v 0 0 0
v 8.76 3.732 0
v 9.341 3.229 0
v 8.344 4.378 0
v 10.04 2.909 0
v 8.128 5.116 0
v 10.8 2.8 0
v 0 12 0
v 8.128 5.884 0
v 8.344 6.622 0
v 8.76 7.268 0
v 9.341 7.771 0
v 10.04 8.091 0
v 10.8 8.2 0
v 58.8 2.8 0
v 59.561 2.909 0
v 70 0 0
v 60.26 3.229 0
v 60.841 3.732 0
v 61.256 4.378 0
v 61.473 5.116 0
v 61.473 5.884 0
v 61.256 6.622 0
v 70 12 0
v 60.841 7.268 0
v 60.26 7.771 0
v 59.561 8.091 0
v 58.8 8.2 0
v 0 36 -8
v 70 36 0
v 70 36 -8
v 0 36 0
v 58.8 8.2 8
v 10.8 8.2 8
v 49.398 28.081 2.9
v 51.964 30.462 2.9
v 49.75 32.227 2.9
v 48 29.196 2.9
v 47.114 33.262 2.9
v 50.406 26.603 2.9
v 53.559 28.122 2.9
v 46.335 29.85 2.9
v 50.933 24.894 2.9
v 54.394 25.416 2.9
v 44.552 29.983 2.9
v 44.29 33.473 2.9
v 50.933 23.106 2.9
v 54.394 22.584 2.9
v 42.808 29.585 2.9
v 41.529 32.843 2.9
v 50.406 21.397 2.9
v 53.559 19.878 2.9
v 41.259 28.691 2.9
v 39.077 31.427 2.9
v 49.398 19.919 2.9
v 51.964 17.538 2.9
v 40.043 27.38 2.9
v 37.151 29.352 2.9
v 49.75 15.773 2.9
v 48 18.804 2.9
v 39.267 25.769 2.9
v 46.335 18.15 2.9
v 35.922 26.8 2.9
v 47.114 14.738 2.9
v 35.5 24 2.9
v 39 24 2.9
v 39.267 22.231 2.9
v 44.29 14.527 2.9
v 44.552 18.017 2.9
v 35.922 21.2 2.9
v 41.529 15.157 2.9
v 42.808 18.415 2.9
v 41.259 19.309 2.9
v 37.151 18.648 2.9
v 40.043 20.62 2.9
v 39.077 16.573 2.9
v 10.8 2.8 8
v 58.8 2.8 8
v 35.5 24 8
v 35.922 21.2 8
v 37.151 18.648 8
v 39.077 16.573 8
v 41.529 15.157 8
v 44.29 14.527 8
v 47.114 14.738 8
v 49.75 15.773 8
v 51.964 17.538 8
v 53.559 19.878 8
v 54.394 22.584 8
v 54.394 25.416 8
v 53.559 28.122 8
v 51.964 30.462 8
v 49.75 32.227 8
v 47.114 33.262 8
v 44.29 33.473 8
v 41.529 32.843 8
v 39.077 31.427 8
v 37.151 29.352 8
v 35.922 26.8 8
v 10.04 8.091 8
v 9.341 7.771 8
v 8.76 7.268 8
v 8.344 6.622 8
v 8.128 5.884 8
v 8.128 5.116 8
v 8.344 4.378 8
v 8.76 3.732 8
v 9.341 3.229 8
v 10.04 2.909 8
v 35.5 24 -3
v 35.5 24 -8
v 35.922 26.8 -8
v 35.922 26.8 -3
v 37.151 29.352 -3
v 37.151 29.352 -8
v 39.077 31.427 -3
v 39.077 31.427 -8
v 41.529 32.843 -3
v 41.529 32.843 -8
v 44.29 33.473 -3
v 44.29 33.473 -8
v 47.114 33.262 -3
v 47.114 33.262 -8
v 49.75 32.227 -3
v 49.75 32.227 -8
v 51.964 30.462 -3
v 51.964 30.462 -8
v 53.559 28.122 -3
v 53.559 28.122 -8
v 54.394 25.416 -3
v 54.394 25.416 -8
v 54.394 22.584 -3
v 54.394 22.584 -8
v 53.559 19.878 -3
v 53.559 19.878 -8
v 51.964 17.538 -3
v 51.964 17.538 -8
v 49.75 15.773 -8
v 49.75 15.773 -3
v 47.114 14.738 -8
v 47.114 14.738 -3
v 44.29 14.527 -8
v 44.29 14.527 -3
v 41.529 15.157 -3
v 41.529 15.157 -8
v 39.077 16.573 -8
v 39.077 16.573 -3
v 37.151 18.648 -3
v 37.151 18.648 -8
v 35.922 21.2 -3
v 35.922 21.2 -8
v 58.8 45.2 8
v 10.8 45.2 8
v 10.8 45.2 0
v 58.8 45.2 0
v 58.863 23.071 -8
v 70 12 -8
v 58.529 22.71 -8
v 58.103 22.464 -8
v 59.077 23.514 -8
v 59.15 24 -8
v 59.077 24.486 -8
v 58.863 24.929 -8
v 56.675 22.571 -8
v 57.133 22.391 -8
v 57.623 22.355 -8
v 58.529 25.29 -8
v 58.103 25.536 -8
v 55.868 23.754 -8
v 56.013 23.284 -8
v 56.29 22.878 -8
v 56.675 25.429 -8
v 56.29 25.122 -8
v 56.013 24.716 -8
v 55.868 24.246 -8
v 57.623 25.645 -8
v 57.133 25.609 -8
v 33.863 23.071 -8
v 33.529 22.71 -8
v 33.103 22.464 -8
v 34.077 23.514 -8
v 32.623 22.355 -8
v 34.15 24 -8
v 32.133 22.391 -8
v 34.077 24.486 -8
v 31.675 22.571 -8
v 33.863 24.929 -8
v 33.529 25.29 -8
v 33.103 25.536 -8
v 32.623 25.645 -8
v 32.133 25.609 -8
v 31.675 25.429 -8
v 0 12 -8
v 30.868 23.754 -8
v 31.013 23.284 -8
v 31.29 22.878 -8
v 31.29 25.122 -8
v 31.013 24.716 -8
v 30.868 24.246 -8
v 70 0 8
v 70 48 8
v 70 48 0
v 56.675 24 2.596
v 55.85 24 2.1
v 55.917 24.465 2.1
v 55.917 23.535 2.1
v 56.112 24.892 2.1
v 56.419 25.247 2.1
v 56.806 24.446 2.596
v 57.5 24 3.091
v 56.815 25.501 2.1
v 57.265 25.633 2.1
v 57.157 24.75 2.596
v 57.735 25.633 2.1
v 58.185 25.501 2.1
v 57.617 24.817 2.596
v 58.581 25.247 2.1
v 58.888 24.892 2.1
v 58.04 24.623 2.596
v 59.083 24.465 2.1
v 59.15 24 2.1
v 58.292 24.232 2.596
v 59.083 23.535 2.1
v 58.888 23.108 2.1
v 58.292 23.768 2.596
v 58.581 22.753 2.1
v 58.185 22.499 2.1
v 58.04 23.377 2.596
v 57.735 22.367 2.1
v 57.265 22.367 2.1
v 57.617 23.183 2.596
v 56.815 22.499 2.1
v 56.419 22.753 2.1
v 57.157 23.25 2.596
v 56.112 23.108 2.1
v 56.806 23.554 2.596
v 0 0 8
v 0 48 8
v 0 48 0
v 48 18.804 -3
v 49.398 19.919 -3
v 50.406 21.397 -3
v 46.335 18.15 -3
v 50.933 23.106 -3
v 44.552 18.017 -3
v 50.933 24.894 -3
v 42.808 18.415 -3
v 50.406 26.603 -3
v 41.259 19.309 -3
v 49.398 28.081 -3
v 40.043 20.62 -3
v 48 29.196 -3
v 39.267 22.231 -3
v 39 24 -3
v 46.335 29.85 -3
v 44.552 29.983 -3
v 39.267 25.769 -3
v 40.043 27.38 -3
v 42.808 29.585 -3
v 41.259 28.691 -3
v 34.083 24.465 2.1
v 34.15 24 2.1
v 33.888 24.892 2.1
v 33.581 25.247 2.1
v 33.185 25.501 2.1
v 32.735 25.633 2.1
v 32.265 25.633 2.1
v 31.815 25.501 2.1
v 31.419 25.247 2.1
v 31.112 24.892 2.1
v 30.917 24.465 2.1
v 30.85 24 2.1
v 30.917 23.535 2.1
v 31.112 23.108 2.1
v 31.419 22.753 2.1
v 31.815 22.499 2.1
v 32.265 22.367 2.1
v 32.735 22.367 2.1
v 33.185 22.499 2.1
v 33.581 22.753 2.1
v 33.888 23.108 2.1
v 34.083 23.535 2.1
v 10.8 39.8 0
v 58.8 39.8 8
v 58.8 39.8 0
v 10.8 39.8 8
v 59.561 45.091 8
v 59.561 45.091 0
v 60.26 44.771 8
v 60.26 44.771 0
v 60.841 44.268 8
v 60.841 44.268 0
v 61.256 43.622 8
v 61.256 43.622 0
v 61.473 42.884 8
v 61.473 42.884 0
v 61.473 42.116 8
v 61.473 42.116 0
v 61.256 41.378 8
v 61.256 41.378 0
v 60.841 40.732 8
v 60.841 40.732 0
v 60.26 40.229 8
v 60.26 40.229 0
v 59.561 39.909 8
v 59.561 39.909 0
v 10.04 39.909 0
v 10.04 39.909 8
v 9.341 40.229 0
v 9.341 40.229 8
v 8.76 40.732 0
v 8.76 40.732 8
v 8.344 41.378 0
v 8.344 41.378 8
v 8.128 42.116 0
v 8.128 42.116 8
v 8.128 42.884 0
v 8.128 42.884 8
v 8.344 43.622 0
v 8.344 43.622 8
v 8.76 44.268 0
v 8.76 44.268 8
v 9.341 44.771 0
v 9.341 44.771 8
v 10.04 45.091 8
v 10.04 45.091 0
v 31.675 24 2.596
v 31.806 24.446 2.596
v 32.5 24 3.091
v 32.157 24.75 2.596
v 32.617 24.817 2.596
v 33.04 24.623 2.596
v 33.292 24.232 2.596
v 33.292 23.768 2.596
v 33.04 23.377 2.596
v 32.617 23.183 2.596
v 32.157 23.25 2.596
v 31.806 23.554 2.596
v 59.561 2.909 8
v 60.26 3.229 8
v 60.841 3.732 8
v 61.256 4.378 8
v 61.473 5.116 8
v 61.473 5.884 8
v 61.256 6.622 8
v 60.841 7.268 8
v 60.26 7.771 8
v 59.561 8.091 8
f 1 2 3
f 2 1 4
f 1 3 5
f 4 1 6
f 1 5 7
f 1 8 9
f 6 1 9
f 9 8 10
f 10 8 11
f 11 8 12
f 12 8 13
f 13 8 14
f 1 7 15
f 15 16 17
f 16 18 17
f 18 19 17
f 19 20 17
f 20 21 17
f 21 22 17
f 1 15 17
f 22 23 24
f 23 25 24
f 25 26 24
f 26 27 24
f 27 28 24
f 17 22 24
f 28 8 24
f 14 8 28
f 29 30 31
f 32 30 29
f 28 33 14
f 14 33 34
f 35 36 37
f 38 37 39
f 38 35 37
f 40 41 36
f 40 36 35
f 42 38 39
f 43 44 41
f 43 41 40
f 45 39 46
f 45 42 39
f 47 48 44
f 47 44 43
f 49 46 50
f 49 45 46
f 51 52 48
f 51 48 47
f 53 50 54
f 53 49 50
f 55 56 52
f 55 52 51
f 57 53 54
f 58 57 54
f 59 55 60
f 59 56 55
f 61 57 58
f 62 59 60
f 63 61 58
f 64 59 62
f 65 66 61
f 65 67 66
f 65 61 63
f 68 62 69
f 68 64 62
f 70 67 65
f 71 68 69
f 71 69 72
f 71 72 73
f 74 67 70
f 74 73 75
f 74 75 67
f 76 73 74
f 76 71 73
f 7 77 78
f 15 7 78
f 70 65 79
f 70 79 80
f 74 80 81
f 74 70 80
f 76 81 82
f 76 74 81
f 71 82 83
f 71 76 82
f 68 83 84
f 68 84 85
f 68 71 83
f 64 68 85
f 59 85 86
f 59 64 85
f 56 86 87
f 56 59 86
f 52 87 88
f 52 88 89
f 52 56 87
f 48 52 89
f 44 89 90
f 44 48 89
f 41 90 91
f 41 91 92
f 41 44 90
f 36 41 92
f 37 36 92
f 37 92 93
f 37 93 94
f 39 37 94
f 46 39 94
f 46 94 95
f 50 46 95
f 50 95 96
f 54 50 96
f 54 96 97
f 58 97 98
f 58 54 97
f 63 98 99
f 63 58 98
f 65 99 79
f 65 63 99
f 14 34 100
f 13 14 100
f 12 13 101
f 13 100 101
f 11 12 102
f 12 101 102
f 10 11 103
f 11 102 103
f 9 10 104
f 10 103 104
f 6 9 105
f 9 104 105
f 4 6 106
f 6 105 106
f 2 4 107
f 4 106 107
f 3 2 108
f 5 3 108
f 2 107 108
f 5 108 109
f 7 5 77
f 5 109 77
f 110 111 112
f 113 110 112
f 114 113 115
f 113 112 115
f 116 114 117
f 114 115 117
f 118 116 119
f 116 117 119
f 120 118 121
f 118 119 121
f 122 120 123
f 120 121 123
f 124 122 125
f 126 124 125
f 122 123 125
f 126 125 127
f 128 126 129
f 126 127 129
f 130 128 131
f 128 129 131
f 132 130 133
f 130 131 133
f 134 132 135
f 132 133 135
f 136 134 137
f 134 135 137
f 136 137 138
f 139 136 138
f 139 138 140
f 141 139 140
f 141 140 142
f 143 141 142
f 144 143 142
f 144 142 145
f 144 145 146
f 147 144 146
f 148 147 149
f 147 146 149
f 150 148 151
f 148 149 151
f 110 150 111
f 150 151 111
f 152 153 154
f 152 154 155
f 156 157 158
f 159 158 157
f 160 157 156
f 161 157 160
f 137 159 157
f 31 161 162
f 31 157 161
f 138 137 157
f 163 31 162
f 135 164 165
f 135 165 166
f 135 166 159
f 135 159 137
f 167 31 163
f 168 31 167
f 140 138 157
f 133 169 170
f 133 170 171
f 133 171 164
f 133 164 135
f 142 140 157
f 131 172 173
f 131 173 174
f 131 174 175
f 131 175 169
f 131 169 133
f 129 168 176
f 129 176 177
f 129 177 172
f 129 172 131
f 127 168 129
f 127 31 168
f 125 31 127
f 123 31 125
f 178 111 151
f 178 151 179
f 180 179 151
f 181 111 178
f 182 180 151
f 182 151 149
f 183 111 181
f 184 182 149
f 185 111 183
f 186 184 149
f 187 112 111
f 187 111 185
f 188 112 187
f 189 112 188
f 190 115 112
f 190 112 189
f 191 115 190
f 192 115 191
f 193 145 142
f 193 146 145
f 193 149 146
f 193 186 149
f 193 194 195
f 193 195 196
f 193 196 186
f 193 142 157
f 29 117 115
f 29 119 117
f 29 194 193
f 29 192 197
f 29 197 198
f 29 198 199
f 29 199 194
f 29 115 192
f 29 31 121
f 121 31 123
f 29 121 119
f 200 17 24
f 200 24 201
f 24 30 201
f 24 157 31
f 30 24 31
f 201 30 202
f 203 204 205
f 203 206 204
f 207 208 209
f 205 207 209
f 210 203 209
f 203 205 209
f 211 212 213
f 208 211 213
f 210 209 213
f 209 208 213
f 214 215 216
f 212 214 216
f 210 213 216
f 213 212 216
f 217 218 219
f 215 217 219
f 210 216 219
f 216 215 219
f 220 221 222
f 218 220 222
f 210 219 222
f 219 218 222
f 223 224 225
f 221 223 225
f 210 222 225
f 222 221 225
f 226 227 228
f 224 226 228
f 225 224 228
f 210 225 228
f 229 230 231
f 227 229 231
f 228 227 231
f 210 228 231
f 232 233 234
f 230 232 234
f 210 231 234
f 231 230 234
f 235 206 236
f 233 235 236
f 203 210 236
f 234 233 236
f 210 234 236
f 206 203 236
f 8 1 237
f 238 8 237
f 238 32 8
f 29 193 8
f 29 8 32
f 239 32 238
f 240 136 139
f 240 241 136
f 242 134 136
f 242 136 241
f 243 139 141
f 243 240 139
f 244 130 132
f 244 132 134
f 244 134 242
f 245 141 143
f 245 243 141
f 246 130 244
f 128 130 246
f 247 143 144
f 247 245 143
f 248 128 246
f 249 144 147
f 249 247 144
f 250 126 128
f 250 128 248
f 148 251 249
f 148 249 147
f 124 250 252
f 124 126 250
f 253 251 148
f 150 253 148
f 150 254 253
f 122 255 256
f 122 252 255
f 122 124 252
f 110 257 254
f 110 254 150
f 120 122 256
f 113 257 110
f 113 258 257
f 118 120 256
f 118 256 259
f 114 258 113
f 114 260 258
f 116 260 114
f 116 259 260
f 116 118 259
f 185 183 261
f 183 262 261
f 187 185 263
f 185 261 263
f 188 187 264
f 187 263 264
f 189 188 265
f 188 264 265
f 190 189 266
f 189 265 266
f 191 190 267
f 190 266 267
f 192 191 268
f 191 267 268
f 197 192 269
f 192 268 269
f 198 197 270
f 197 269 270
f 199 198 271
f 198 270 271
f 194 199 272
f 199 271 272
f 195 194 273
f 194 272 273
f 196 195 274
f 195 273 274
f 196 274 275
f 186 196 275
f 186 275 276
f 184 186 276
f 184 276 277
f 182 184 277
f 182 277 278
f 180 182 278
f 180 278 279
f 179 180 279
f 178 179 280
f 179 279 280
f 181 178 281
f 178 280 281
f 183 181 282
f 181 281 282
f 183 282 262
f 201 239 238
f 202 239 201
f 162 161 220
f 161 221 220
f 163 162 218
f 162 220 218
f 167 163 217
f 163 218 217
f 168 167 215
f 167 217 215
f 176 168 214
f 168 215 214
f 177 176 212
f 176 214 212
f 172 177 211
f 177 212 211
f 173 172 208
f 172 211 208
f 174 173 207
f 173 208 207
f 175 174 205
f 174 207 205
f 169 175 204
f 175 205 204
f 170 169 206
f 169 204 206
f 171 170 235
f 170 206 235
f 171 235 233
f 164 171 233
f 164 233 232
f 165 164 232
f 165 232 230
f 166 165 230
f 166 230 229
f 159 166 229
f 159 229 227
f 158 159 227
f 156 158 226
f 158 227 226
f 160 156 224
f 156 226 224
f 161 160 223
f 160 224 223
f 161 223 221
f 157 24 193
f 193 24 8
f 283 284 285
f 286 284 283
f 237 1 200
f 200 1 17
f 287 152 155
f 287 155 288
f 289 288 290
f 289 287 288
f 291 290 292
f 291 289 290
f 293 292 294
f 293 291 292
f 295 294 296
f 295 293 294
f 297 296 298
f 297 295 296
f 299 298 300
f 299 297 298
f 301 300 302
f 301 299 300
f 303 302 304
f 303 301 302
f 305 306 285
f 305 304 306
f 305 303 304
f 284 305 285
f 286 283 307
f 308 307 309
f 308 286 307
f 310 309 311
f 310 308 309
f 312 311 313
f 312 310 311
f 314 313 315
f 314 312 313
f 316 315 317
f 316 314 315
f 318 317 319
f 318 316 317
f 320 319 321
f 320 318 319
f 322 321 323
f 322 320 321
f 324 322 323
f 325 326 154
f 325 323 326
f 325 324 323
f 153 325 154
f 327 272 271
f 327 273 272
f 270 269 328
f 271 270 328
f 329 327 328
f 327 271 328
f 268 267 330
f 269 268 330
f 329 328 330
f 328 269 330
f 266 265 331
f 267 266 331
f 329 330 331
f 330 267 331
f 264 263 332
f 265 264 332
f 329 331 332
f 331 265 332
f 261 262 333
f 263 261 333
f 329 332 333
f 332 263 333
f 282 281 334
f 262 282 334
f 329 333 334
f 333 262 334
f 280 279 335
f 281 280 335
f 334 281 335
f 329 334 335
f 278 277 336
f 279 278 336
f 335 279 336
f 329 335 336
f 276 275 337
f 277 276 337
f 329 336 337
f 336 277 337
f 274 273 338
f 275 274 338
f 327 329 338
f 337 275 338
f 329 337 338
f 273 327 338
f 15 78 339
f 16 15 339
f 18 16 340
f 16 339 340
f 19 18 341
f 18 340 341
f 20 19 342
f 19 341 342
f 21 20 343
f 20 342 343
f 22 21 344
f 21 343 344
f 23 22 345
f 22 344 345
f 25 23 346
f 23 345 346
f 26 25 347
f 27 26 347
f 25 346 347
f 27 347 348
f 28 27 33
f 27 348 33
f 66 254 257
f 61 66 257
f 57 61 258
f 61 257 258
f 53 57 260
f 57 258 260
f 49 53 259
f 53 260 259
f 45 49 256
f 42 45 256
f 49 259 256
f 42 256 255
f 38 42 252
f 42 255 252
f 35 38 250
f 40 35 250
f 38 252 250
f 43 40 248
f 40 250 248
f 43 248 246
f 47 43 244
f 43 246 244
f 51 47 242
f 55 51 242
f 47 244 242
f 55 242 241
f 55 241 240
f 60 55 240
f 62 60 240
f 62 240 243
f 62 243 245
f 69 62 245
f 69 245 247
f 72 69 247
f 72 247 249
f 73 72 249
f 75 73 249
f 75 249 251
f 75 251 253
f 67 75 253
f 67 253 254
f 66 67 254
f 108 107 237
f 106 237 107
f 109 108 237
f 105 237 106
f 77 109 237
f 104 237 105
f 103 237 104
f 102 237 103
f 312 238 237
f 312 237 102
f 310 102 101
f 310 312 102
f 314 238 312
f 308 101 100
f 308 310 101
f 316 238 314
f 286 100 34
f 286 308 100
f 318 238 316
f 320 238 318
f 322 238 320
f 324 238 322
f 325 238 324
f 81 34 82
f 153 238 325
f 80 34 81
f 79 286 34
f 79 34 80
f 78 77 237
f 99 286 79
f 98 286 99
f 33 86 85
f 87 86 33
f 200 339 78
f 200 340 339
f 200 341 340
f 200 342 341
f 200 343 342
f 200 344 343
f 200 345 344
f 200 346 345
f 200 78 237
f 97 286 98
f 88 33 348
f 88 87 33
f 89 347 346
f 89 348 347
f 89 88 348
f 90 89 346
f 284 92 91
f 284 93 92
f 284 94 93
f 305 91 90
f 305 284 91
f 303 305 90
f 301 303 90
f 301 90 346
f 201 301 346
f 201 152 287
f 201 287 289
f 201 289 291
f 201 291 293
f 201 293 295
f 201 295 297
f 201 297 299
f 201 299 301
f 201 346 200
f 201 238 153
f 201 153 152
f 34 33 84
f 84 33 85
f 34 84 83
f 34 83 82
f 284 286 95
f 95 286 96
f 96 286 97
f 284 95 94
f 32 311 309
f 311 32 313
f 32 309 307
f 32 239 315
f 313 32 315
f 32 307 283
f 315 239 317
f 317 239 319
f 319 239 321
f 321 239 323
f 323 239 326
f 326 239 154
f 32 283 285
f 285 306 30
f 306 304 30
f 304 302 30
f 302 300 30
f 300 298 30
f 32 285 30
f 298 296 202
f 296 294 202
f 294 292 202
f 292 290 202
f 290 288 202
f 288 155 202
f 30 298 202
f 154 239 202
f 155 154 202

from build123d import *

# Parameters (mm, degrees)
SKETCH_1_W             = 70
SKETCH_1_H             = 48
EXTRUDE_1_DEPTH        = 8
SKETCH_2_W             = 70
SKETCH_2_H             = 24
EXTRUDE_2_DEPTH        = 8
SKETCH_3_R             = 6
CUT_EXTRUDE_1_DEPTH    = 87.371291527
SKETCH_6_R             = 9.5
CUT_EXTRUDE_4_DEPTH    = 5
CUT_EXTRUDE_START      = -5.1
SKETCH_7_R             = 9.5
CUT_EXTRUDE_5_DEPTH    = 5.1
HOLE_WIZARD_M4_1_D     = 3.3
HOLE_WIZARD_M4_1_DEPTH = 10.1
HOLE_WIZARD_M4_1_TIP   = 0.991420021
CUT_EXTRUDE_6_DEPTH    = 87.371291527


with BuildPart() as part:
    # 草图1 → 凸台-拉伸1 (new body)
    with BuildSketch(Plane.XY):
        with Locations((35, 24)):
            Rectangle(SKETCH_1_W, SKETCH_1_H)
    extrude(amount=EXTRUDE_1_DEPTH)

    # 草图2 → 凸台-拉伸2 (add)
    with BuildSketch(Plane(origin=(0, 0, 0), x_dir=(-1, 0, 0), z_dir=(0, 0, -1))):
        with Locations((-35, 24)):
            Rectangle(SKETCH_2_W, SKETCH_2_H)
    extrude(amount=EXTRUDE_2_DEPTH)

    # 草图3 → 切除-拉伸1 (cut, through all)
    with BuildSketch(Plane(origin=(0, 0, -8), x_dir=(-1, 0, 0), z_dir=(0, 0, -1))):
        with Locations((-45, 24)):
            Circle(SKETCH_3_R)
    extrude(amount=-CUT_EXTRUDE_1_DEPTH, mode=Mode.SUBTRACT)

    # 草图6 → 切除-拉伸4 (cut)
    with BuildSketch(Plane(origin=(0, 0, -8), x_dir=(-1, 0, 0), z_dir=(0, 0, -1))):
        with Locations((-45, 24)):
            Circle(SKETCH_6_R)
    extrude(amount=-CUT_EXTRUDE_4_DEPTH, mode=Mode.SUBTRACT)

    # 草图7 → 切除-拉伸5 (cut)
    with BuildSketch(Plane.XY.offset(8).offset(CUT_EXTRUDE_START)):
        with Locations(Location((45, 24, 0), (0, 0, 180))):
            Circle(SKETCH_7_R)
    extrude(amount=CUT_EXTRUDE_5_DEPTH, mode=Mode.SUBTRACT)

    # M4 螺纹孔1
    with Locations(Plane(origin=(0, 0, -8), x_dir=(-1, 0, 0), z_dir=(0, 0, -1))):
        with Locations((-57.5, 24), (-32.5, 24)):
            Hole(HOLE_WIZARD_M4_1_D / 2, depth=HOLE_WIZARD_M4_1_DEPTH)
            with Locations((0, 0, -(HOLE_WIZARD_M4_1_DEPTH + HOLE_WIZARD_M4_1_TIP / 2))):  # 118° drill point
                Cone(0, HOLE_WIZARD_M4_1_D / 2, HOLE_WIZARD_M4_1_TIP, mode=Mode.SUBTRACT)

    # 草图10 → 切除-拉伸6 (cut, through all)
    with BuildSketch(Plane.XY.offset(8)):
        with BuildLine():
            Line((10.800456012, 45.2), (58.800456012, 45.2))
            ThreePointArc((58.800456012, 45.2), (61.500456012, 42.5), (58.800456012, 39.8))
            Line((58.800456012, 39.8), (10.800456012, 39.8))
            ThreePointArc((10.800456012, 39.8), (8.100456012, 42.5), (10.800456012, 45.2))
        make_face()
        with BuildLine():
            Line((10.800456012, 2.8), (58.800456012, 2.8))
            ThreePointArc((58.800456012, 2.8), (61.500456012, 5.5), (58.800456012, 8.2))
            Line((58.800456012, 8.2), (10.800456012, 8.2))
            ThreePointArc((10.800456012, 8.2), (8.100456012, 5.5), (10.800456012, 2.8))
        make_face()
    extrude(amount=-CUT_EXTRUDE_6_DEPTH, mode=Mode.SUBTRACT)


solid = part.part
